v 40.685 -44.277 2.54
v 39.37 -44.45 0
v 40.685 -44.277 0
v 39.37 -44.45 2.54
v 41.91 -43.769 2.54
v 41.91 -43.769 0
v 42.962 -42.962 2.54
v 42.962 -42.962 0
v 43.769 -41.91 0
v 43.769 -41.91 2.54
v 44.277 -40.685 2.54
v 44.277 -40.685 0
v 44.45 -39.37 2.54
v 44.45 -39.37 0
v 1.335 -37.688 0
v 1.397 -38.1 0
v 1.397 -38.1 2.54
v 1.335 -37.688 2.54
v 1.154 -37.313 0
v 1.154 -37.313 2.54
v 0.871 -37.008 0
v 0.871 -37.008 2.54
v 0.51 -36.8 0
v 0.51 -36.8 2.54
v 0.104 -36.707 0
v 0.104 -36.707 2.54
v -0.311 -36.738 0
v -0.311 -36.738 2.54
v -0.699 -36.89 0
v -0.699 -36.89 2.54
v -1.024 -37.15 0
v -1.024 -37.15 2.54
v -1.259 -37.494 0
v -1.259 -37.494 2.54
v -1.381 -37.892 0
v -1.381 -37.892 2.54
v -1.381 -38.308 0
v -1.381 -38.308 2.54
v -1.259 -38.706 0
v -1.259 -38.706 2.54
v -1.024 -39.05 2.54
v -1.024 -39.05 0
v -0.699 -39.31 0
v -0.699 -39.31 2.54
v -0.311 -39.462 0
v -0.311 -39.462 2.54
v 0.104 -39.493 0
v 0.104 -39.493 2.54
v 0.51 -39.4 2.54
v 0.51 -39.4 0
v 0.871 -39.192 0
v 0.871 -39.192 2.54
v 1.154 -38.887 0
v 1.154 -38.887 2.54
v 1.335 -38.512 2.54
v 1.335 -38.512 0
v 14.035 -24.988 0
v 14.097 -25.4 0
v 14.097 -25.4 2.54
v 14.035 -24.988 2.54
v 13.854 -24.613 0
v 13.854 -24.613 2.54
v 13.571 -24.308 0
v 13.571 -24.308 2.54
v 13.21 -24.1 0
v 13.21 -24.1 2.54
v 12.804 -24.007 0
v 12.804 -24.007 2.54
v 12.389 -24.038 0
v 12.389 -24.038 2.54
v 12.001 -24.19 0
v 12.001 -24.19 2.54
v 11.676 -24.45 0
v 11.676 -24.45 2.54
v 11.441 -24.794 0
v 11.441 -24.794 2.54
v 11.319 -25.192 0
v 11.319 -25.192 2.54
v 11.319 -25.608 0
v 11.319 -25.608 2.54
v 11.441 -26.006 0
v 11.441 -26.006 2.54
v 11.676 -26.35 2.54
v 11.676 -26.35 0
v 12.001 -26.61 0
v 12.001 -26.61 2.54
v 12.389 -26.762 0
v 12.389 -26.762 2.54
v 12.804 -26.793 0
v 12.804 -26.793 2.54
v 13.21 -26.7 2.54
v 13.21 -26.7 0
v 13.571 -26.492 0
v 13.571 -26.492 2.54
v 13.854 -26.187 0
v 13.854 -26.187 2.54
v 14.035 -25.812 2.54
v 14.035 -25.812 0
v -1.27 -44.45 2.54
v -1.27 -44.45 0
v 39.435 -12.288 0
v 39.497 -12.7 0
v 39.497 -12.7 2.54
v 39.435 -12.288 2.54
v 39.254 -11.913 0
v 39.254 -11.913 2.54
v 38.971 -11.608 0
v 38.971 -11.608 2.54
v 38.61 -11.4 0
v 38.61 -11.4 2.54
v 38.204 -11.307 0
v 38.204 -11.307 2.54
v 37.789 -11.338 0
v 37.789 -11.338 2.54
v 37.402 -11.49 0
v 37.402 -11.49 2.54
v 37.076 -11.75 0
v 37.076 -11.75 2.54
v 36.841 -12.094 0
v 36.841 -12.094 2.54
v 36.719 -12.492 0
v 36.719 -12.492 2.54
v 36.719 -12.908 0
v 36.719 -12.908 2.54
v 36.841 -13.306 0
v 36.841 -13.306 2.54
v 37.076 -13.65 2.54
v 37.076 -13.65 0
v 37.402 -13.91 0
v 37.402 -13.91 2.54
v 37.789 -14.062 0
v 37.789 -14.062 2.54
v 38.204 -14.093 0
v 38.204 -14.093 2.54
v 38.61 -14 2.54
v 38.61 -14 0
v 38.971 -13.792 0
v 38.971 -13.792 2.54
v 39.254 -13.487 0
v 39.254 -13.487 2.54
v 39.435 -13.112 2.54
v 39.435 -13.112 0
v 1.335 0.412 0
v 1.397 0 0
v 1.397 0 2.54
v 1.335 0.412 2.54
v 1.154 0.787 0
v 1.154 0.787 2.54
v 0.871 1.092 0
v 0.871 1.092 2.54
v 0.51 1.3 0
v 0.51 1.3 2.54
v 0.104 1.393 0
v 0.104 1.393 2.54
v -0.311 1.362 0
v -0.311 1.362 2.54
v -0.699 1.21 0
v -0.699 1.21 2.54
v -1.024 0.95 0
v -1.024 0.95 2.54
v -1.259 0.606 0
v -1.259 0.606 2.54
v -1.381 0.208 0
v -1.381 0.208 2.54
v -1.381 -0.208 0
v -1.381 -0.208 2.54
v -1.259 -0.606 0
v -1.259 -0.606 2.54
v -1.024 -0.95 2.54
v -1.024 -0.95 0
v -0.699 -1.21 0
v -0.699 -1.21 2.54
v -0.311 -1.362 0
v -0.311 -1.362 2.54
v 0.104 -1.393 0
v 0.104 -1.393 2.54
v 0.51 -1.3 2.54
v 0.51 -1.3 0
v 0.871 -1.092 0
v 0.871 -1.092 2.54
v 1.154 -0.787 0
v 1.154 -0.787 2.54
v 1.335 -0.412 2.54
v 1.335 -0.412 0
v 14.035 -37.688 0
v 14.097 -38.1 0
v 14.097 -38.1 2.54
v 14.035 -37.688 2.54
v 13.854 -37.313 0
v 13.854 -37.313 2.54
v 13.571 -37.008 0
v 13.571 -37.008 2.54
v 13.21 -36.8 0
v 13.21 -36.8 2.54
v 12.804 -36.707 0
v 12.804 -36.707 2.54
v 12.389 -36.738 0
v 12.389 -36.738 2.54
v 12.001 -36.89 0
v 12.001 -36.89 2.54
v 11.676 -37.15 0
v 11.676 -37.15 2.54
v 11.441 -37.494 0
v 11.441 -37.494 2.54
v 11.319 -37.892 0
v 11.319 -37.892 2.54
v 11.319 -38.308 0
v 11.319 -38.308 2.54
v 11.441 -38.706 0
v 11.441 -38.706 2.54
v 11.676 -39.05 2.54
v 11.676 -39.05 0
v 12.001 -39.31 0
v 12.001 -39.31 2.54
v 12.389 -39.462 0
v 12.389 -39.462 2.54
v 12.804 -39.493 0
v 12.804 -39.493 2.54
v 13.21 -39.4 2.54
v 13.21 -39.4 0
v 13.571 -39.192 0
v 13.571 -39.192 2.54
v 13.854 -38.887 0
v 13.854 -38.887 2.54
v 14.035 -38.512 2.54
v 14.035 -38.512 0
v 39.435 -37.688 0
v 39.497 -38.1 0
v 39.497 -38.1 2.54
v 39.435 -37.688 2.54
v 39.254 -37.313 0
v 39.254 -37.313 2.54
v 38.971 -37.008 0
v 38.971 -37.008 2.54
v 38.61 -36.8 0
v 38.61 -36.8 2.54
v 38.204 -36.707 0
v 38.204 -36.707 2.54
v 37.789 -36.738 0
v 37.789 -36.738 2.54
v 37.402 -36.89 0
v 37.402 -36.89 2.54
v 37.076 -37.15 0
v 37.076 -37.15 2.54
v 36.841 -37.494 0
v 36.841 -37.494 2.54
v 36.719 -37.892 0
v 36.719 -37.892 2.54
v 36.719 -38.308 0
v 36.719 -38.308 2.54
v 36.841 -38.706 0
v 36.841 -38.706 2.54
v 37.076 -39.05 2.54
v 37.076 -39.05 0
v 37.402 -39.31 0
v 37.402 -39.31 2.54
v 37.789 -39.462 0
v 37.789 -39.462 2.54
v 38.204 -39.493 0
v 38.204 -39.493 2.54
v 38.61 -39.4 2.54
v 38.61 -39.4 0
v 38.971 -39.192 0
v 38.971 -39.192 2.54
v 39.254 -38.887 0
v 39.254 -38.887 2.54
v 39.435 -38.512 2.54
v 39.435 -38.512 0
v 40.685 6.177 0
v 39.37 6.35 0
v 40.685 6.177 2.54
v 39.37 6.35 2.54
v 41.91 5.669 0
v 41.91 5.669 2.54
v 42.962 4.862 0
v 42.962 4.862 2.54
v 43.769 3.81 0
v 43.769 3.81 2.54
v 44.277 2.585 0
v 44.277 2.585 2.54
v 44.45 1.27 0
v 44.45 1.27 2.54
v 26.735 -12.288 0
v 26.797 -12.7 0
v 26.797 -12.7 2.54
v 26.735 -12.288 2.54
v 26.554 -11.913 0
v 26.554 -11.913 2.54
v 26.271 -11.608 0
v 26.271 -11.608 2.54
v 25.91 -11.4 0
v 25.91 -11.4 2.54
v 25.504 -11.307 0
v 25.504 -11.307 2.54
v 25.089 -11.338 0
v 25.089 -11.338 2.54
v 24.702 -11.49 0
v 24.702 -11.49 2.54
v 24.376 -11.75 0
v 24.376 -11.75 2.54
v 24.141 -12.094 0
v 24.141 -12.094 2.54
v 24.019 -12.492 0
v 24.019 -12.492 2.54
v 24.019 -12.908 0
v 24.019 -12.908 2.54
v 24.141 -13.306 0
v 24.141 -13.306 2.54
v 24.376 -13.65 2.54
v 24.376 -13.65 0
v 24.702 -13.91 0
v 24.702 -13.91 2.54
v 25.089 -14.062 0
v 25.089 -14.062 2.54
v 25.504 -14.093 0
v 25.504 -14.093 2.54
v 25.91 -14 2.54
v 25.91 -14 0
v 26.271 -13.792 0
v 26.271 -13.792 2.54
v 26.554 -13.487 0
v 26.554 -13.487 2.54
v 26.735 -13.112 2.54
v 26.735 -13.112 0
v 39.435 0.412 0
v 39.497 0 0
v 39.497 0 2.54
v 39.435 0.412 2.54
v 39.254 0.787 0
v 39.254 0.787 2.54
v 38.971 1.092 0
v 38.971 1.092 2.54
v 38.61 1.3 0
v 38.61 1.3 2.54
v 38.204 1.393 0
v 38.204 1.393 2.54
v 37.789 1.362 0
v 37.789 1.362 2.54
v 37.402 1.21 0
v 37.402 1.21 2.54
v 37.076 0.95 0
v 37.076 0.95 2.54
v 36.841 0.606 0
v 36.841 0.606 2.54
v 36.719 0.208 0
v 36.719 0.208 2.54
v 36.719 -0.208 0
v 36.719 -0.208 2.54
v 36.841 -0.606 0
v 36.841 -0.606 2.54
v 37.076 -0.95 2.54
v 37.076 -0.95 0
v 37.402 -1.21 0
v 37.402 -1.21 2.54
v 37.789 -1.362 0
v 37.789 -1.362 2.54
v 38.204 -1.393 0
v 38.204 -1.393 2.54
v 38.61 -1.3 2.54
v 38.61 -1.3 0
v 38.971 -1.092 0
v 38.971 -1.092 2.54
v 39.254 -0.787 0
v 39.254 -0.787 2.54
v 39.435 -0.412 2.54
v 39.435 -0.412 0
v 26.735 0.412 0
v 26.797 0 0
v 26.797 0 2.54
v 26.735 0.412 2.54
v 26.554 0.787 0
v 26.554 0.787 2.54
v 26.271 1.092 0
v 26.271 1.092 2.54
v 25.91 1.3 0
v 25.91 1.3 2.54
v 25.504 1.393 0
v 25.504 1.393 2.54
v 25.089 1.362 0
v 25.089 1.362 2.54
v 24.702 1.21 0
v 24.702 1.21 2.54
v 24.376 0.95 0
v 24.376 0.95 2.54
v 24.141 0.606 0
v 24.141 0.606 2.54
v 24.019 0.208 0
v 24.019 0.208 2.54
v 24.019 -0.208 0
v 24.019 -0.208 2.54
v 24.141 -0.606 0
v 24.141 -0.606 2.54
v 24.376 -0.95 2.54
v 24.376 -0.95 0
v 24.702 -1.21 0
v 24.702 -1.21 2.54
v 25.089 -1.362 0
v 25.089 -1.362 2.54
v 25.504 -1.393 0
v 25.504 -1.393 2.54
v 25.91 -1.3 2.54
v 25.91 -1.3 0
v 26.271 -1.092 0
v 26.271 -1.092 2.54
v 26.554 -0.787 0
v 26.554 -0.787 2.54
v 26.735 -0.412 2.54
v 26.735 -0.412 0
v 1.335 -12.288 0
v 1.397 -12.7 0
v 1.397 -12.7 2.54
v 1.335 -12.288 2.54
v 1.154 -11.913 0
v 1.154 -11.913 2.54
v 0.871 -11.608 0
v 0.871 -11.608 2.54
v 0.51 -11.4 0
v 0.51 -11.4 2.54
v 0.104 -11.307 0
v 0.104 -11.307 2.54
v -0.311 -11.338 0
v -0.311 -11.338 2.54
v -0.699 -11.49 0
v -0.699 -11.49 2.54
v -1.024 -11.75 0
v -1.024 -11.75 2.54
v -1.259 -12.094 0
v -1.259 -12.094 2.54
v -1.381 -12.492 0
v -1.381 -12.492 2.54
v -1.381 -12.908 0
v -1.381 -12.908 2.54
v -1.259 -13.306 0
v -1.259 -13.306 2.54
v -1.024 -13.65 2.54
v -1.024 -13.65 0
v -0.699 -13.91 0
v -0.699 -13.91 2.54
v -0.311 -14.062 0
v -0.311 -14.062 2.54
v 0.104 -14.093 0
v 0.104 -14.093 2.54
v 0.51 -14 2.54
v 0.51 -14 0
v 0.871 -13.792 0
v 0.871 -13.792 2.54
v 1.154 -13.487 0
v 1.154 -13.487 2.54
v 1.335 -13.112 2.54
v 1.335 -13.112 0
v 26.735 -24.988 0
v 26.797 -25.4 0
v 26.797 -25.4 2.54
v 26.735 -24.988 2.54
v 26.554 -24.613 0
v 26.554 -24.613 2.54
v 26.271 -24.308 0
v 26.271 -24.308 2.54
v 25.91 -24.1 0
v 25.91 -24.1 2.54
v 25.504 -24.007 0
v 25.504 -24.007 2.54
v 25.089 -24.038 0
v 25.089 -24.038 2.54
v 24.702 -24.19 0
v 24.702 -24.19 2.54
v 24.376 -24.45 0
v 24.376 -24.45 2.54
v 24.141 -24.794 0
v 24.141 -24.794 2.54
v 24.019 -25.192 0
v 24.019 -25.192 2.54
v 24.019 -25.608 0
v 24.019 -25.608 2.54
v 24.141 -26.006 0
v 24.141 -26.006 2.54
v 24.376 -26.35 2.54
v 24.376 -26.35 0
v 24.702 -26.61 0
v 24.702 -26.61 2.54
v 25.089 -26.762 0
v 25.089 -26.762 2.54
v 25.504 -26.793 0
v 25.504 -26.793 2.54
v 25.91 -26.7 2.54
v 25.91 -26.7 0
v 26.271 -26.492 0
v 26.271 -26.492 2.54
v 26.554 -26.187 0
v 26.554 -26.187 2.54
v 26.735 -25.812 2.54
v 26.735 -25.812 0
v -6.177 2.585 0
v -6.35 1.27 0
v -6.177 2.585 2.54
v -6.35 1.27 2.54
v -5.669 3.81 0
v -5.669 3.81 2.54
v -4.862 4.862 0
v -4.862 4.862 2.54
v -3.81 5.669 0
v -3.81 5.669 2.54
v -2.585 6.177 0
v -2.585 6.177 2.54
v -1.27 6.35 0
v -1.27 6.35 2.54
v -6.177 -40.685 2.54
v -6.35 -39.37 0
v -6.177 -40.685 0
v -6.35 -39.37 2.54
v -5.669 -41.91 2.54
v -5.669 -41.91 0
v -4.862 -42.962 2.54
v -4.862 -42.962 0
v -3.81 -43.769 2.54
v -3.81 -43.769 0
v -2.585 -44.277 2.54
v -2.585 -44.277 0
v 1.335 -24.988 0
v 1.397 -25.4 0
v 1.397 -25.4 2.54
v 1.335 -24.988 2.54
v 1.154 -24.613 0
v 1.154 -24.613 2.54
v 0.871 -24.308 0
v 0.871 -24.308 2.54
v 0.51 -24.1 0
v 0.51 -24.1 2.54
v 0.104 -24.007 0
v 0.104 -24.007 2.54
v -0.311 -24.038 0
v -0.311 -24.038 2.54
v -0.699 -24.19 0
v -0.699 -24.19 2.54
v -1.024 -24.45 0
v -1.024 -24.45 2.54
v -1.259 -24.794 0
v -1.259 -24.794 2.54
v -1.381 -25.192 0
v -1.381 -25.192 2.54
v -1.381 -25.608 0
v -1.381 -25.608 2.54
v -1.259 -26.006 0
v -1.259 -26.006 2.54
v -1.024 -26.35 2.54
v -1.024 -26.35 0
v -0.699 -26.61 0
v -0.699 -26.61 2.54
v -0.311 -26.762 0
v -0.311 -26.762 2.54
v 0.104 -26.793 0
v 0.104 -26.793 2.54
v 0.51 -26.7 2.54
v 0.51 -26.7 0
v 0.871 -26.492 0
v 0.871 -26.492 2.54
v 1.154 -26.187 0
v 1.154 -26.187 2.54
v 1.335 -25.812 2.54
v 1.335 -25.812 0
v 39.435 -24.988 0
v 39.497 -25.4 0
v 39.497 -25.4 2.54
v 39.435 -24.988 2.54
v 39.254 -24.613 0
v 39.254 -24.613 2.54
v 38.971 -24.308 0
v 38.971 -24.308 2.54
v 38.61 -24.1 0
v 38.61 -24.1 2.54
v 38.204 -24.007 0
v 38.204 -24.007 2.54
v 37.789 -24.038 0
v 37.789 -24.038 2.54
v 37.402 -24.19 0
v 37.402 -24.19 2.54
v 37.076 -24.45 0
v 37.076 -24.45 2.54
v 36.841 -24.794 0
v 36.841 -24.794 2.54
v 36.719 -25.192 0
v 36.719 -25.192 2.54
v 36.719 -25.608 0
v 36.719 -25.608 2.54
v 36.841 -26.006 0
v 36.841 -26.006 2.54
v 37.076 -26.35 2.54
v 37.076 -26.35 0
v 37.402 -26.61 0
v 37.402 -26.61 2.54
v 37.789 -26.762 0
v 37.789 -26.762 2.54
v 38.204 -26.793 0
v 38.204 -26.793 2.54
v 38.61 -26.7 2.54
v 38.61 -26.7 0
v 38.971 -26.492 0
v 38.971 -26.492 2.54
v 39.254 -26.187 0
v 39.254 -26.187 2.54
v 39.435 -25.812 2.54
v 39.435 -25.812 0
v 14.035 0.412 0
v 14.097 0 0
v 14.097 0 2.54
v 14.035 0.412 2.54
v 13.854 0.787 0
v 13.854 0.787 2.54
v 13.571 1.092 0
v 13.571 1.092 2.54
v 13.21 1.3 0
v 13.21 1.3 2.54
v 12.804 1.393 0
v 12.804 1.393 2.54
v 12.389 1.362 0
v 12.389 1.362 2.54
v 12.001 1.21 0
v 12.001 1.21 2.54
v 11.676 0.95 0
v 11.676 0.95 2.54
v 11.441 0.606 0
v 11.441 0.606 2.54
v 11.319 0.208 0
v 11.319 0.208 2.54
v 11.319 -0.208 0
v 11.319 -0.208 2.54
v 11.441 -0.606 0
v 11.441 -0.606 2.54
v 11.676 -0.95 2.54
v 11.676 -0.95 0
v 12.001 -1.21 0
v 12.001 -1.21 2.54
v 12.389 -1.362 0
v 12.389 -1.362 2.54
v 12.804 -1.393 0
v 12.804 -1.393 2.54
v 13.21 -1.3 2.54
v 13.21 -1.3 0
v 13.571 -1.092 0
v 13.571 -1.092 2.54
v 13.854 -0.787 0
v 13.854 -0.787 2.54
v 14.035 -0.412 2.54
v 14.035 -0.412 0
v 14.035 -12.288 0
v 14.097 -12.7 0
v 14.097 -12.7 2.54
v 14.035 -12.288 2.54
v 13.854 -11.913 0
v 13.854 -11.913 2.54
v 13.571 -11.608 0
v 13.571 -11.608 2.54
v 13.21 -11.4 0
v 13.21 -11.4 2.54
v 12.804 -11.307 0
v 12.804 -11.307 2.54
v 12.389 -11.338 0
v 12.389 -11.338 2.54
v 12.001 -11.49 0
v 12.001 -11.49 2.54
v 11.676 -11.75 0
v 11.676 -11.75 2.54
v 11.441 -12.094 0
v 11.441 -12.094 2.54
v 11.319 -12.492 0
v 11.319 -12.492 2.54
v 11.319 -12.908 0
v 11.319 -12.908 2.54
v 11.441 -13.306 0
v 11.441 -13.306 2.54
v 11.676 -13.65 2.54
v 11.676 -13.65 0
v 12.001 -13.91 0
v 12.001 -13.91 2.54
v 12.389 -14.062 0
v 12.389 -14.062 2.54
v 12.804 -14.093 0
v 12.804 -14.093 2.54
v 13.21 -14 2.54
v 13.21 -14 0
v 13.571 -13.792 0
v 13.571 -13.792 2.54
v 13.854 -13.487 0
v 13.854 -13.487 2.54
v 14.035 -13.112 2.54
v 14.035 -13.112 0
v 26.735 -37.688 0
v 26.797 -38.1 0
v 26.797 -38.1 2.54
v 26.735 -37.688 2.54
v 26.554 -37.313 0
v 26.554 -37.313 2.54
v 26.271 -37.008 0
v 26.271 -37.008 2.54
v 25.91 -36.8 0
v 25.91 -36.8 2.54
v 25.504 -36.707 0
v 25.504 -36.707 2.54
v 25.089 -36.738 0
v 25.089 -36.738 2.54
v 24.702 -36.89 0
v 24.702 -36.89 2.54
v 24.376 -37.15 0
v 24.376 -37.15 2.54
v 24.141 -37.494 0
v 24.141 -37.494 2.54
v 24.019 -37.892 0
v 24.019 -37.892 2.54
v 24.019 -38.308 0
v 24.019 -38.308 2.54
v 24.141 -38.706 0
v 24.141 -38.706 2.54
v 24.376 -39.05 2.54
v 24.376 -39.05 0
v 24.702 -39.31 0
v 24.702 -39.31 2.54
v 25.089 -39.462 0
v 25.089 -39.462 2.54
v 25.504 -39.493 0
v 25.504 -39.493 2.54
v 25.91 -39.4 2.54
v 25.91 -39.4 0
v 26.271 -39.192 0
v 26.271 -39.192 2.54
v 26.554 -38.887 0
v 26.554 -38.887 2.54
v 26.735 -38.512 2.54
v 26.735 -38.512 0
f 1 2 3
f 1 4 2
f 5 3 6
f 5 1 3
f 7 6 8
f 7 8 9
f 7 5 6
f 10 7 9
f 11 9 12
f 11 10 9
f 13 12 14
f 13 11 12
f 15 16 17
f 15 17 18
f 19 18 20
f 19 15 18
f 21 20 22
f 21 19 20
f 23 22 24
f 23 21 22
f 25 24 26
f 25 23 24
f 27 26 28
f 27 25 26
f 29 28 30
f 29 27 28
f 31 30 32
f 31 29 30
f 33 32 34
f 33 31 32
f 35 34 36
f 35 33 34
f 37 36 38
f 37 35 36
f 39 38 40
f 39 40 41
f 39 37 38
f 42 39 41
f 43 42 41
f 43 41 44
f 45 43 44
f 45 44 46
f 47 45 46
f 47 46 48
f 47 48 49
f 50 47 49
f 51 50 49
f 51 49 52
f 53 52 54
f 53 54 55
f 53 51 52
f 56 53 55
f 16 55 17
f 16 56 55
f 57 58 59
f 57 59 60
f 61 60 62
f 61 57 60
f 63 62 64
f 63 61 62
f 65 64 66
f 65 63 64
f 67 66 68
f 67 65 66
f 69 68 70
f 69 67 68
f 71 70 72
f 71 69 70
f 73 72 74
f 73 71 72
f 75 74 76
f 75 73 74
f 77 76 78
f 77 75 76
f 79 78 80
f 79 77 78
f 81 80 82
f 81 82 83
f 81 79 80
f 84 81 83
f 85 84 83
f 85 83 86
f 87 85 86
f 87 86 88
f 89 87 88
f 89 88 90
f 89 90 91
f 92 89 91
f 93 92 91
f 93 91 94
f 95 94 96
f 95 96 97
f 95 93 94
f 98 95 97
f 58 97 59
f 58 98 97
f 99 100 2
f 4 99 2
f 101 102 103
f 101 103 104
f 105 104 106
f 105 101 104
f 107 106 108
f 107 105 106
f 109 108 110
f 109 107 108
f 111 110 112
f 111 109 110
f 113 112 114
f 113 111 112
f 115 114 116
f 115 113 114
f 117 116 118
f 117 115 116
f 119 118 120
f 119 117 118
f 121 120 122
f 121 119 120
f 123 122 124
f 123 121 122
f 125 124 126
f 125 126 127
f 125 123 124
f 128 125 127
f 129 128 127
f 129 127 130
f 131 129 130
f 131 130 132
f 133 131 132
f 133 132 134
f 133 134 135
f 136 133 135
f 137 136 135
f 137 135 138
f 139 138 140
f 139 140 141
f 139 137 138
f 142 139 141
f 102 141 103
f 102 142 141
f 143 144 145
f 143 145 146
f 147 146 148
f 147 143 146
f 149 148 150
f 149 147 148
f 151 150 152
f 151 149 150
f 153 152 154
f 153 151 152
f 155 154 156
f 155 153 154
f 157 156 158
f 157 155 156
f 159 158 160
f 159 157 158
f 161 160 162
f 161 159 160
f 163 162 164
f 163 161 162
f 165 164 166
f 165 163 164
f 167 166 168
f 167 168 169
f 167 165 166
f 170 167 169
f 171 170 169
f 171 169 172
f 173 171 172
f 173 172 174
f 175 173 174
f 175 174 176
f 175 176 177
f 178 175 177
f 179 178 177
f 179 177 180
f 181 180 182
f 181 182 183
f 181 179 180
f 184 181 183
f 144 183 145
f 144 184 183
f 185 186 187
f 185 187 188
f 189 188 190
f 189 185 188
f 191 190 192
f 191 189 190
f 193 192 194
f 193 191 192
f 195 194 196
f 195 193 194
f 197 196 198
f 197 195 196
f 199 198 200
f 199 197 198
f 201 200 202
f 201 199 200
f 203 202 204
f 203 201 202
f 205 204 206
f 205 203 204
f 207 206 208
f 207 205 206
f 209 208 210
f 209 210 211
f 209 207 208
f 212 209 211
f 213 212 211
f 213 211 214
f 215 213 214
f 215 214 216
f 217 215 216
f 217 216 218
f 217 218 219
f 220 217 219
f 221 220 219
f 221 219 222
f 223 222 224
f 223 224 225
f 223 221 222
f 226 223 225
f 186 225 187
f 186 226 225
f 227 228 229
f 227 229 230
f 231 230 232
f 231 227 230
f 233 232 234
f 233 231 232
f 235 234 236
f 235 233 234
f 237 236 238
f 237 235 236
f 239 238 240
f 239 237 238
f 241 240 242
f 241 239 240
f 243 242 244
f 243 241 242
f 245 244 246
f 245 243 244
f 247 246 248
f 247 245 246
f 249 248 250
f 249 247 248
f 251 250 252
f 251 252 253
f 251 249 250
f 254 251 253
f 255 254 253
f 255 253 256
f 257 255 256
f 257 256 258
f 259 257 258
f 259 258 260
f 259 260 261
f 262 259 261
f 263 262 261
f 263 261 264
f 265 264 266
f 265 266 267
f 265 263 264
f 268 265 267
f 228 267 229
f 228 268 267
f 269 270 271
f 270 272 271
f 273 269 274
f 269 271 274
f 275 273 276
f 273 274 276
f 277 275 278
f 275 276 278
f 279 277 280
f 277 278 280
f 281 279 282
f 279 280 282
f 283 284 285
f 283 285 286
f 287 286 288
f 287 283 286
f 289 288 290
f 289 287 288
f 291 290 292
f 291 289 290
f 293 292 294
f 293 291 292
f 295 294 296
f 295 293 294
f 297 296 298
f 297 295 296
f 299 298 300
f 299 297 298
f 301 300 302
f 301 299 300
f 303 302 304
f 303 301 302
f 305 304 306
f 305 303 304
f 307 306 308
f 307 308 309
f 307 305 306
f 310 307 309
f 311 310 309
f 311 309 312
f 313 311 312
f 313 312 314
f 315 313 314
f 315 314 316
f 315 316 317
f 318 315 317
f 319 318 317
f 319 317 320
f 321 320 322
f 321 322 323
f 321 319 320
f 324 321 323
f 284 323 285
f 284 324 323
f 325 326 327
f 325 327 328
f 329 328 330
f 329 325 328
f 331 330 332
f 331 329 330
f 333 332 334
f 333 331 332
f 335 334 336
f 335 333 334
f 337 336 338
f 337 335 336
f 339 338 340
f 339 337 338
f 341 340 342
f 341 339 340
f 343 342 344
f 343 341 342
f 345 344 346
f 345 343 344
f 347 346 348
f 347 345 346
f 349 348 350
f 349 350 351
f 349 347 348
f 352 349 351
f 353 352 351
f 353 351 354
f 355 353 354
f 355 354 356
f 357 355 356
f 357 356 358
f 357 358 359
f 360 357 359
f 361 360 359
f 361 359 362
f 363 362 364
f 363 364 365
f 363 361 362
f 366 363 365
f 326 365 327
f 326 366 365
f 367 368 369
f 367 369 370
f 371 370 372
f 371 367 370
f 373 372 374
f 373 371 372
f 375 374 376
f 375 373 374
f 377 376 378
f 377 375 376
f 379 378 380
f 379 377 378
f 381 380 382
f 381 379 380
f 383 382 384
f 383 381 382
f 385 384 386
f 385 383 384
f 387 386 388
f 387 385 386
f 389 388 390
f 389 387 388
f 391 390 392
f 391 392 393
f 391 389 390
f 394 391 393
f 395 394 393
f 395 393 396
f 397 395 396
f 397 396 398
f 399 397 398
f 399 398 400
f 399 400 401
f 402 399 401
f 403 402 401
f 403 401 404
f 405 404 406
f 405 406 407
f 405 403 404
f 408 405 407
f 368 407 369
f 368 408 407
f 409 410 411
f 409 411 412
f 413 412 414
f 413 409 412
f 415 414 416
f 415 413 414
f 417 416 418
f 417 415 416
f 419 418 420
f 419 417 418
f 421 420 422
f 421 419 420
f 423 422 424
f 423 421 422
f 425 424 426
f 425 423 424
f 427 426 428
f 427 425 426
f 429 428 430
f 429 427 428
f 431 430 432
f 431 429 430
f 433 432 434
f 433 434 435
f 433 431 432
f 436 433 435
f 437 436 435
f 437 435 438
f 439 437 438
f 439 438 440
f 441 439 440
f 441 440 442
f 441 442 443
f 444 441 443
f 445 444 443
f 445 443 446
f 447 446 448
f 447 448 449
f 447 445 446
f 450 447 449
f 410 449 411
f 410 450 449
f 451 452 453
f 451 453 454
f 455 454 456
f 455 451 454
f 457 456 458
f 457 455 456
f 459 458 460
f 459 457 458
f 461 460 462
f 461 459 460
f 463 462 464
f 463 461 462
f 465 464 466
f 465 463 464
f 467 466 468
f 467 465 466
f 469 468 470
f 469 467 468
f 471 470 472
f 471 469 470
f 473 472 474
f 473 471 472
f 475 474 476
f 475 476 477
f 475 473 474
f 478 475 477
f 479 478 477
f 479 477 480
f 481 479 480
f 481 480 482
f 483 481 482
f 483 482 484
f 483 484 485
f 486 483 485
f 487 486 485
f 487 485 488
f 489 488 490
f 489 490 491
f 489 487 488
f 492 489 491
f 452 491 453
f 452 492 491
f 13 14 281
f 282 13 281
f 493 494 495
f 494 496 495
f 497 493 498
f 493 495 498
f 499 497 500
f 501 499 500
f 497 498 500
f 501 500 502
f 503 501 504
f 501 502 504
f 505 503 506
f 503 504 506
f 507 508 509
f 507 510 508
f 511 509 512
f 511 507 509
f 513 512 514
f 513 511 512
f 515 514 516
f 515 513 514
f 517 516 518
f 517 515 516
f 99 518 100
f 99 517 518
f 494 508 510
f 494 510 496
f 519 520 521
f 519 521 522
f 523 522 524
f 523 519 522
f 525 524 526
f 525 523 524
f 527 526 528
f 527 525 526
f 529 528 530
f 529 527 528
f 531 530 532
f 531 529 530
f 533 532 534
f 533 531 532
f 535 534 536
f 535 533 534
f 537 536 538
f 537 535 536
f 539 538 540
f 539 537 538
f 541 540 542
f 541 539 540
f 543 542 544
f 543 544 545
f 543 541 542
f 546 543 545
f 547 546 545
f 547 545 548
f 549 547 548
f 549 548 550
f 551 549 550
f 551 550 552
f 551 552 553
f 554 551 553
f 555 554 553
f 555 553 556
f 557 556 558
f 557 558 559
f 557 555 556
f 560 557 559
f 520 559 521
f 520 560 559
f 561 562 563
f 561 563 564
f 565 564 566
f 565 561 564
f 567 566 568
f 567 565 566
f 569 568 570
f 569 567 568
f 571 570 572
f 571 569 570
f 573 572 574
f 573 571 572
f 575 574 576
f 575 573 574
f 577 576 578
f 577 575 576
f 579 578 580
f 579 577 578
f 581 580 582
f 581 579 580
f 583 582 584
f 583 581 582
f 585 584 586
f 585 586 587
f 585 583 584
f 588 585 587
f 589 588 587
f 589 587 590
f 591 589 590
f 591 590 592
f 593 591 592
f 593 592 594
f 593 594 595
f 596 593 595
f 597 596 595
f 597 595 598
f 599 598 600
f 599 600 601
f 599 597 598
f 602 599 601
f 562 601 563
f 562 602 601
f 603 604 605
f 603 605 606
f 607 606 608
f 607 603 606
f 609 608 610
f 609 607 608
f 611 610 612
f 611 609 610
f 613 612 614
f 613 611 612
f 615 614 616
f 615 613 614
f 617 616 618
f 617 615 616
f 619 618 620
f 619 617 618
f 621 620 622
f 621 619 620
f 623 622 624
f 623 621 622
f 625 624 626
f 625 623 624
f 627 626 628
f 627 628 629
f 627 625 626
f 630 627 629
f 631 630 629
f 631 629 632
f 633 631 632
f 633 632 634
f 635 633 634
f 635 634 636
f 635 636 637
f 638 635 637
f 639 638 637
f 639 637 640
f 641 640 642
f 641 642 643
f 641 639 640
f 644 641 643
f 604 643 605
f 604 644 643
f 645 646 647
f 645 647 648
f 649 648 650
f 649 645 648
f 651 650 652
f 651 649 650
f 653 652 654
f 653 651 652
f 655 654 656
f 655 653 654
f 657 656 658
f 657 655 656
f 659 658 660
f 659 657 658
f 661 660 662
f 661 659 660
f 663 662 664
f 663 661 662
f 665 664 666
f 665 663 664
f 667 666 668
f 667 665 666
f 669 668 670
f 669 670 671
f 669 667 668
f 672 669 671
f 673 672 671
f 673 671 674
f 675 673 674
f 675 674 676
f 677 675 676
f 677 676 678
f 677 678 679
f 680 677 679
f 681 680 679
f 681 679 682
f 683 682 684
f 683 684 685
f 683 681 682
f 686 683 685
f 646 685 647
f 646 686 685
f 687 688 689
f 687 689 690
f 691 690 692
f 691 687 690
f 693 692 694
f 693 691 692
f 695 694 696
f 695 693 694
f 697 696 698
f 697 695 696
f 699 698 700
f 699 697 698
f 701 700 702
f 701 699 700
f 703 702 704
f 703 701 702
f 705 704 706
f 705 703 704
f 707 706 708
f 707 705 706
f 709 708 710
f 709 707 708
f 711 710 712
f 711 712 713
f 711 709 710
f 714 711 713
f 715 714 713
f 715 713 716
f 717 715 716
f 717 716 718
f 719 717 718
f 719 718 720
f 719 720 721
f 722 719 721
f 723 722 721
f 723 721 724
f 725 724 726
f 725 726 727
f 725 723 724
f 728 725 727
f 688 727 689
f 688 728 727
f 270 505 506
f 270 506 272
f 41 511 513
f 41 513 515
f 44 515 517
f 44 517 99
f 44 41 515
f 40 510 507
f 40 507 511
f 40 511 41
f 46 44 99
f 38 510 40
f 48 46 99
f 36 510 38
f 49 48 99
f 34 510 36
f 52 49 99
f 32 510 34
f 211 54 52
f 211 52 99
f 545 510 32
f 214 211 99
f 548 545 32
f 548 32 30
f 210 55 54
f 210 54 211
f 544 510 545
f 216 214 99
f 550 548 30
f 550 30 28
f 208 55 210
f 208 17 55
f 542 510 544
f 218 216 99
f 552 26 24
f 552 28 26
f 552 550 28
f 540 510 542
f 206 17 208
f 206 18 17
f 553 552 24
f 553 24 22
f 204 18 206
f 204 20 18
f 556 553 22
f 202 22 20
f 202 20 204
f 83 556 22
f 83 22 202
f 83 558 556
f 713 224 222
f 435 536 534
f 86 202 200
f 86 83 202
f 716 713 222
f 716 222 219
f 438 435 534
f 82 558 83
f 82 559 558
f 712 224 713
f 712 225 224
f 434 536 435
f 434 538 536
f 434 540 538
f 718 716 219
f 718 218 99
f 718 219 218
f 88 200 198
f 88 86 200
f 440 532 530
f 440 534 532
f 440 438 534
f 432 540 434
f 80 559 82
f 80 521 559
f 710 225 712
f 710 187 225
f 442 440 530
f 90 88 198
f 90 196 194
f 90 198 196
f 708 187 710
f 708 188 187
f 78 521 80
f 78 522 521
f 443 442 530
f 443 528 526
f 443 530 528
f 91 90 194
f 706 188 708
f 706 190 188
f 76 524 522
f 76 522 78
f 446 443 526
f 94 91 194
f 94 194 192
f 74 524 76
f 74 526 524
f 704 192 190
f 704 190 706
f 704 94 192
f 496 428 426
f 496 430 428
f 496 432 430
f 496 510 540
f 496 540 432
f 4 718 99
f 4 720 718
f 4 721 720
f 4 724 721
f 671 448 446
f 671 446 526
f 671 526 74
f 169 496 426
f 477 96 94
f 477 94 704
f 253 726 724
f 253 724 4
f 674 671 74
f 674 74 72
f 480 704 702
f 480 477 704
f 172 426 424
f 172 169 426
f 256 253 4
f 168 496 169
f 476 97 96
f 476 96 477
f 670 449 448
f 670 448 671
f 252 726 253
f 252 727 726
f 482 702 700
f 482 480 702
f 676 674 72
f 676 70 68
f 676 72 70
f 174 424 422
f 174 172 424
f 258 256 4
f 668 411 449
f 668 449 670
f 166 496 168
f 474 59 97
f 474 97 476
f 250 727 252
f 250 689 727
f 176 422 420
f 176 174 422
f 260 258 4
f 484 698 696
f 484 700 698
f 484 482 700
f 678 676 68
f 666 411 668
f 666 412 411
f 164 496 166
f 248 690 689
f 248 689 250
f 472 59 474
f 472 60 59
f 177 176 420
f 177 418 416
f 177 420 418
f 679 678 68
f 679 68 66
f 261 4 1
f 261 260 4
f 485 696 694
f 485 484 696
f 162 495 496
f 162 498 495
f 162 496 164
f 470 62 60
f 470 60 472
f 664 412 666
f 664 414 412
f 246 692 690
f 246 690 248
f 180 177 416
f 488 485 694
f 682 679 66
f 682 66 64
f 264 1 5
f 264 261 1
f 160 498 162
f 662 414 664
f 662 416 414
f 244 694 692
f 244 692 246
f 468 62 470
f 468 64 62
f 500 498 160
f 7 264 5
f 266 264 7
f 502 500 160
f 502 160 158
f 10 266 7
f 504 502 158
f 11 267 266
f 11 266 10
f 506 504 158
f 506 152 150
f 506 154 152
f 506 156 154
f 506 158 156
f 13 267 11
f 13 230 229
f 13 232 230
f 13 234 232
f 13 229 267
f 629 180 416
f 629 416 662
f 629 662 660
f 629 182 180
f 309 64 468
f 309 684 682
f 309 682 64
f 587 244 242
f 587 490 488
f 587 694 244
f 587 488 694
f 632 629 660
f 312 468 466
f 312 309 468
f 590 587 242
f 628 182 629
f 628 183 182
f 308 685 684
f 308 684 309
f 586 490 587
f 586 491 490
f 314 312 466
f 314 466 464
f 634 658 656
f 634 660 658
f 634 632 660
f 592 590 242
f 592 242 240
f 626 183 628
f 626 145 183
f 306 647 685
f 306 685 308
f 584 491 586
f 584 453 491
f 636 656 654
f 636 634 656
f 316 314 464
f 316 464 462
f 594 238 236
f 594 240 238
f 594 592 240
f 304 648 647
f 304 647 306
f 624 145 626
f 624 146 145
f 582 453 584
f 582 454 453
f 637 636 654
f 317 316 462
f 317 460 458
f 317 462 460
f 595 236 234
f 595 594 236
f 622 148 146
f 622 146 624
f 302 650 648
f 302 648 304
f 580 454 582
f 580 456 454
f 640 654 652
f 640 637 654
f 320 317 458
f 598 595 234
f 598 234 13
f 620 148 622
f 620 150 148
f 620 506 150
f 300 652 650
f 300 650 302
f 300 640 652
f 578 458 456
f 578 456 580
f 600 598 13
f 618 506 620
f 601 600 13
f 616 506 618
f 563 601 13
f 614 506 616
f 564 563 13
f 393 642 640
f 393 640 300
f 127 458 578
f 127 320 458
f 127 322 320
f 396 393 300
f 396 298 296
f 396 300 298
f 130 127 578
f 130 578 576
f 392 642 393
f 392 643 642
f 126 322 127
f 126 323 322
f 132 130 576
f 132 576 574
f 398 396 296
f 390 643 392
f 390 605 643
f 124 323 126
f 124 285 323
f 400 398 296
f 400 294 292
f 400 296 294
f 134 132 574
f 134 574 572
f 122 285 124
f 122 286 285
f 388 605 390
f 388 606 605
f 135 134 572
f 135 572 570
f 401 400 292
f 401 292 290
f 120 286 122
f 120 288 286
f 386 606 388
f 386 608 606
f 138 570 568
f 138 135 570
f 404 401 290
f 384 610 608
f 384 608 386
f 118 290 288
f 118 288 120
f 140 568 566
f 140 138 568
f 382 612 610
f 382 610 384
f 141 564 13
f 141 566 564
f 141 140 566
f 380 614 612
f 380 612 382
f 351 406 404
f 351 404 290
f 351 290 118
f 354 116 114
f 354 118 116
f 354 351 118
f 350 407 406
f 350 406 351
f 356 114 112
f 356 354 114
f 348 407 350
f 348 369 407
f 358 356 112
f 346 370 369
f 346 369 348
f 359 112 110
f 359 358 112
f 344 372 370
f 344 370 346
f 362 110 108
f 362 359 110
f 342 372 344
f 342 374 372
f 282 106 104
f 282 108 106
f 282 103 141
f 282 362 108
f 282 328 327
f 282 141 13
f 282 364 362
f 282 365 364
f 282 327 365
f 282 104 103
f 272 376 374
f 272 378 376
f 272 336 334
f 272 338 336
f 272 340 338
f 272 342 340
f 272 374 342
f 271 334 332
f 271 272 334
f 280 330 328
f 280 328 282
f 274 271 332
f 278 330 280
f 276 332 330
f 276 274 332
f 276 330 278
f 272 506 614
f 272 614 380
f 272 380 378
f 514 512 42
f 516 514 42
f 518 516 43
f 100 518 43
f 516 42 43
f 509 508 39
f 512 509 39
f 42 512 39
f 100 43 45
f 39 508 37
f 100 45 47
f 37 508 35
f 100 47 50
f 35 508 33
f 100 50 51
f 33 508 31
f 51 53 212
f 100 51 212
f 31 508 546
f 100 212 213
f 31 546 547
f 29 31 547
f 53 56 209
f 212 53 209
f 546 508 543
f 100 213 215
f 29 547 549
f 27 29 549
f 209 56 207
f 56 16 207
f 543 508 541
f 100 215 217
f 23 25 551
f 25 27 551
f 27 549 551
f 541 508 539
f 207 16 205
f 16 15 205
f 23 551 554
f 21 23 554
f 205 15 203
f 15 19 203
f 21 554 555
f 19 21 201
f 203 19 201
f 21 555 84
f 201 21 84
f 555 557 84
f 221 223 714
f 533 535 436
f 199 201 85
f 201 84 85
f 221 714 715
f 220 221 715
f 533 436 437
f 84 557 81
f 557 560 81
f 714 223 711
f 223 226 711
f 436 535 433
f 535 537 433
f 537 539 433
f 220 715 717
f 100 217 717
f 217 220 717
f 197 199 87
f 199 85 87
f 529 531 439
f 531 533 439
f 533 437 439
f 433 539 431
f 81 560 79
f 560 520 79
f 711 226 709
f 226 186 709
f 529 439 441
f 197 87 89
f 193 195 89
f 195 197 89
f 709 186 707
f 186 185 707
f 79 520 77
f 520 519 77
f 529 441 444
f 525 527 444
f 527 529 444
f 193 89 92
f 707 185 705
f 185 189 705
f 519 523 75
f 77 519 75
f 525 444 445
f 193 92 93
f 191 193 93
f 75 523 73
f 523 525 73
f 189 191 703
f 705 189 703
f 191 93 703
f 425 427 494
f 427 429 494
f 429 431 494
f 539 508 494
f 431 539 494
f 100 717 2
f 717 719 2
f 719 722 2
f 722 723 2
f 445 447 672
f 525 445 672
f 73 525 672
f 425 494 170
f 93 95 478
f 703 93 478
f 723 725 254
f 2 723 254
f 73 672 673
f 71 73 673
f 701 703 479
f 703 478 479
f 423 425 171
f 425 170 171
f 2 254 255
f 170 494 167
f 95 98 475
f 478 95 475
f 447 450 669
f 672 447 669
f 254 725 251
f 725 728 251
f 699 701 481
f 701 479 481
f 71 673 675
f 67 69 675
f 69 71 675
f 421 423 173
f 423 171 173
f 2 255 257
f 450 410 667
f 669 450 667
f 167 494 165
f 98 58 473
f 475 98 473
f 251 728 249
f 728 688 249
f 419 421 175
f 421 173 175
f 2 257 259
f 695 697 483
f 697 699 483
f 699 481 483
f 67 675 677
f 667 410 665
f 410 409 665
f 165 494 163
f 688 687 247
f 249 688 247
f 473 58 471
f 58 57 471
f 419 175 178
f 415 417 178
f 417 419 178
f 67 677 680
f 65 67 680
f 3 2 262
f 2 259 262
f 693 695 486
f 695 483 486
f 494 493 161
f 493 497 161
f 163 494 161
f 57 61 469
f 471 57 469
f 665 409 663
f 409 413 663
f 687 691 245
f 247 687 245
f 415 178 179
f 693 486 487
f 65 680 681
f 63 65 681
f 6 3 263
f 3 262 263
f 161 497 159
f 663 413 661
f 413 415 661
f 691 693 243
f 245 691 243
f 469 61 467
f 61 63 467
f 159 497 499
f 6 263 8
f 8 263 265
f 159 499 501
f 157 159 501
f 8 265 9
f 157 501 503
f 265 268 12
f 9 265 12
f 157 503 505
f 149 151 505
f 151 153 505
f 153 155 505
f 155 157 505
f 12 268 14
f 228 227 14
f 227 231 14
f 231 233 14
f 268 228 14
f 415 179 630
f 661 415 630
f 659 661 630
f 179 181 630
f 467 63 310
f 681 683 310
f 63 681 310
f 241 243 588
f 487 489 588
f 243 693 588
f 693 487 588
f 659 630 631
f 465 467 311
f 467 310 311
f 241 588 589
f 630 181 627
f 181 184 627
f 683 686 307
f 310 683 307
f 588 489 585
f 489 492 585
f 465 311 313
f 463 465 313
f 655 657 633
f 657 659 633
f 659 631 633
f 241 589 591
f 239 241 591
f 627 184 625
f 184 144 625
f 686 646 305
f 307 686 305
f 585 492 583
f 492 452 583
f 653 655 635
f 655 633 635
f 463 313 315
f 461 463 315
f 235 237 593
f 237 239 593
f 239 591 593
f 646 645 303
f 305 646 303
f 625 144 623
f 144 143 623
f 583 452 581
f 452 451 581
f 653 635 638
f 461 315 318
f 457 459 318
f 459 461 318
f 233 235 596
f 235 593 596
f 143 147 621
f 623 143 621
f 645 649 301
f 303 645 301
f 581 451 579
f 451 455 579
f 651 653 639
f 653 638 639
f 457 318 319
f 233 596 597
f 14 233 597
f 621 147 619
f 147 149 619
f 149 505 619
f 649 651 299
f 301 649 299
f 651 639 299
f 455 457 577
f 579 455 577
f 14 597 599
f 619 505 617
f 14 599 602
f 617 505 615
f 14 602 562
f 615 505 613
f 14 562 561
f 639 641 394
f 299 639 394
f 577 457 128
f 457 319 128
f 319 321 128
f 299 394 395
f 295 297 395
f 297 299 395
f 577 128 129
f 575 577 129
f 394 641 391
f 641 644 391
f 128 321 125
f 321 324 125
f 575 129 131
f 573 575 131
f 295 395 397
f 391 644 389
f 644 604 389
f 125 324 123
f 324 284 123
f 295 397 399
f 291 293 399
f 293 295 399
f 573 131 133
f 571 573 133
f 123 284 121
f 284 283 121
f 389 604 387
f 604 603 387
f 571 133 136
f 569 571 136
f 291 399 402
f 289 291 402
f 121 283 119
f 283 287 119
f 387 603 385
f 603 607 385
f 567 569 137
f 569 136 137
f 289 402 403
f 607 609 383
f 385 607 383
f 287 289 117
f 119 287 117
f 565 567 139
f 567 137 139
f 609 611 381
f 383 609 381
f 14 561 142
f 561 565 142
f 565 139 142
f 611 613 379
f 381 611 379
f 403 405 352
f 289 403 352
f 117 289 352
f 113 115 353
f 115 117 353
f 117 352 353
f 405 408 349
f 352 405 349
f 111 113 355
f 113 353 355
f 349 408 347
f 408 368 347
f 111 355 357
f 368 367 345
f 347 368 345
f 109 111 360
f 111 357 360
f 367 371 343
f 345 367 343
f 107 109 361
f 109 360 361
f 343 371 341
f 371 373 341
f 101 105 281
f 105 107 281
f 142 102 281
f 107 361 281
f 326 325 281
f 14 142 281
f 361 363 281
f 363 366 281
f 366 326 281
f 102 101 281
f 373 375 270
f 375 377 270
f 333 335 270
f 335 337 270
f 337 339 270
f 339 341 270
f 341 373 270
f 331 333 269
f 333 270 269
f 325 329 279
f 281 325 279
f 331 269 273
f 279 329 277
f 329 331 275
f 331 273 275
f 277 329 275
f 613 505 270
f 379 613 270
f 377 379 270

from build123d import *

# Parameters (mm, degrees)
SKETCH1_W           = 50.8
SKETCH1_H           = 50.8
SKETCH1_R           = 1.397
BOSS_EXTRUDE1_DEPTH = 2.54
FILLET1_R           = 5.08


with BuildPart() as part:
    # Sketch1 → Boss-Extrude1 (new body)
    with BuildSketch(Plane.XY):
        with Locations((19.05, -19.05)):
            Rectangle(SKETCH1_W, SKETCH1_H)
        Circle(SKETCH1_R, mode=Mode.SUBTRACT)
        with Locations((12.7, 0)):
            Circle(SKETCH1_R, mode=Mode.SUBTRACT)
        with Locations((25.4, 0)):
            Circle(SKETCH1_R, mode=Mode.SUBTRACT)
        with Locations((38.1, 0)):
            Circle(SKETCH1_R, mode=Mode.SUBTRACT)
        with Locations((12.7, -12.7)):
            Circle(SKETCH1_R, mode=Mode.SUBTRACT)
        with Locations((25.4, -12.7)):
            Circle(SKETCH1_R, mode=Mode.SUBTRACT)
        with Locations((38.1, -12.7)):
            Circle(SKETCH1_R, mode=Mode.SUBTRACT)
        with Locations((12.7, -25.4)):
            Circle(SKETCH1_R, mode=Mode.SUBTRACT)
        with Locations((25.4, -25.4)):
            Circle(SKETCH1_R, mode=Mode.SUBTRACT)
        with Locations((38.1, -25.4)):
            Circle(SKETCH1_R, mode=Mode.SUBTRACT)
        with Locations((12.7, -38.1)):
            Circle(SKETCH1_R, mode=Mode.SUBTRACT)
        with Locations((25.4, -38.1)):
            Circle(SKETCH1_R, mode=Mode.SUBTRACT)
        with Locations((38.1, -38.1)):
            Circle(SKETCH1_R, mode=Mode.SUBTRACT)
        with Locations((0, -12.7)):
            Circle(SKETCH1_R, mode=Mode.SUBTRACT)
        with Locations((0, -25.4)):
            Circle(SKETCH1_R, mode=Mode.SUBTRACT)
        with Locations((0, -38.1)):
            Circle(SKETCH1_R, mode=Mode.SUBTRACT)
    extrude(amount=BOSS_EXTRUDE1_DEPTH)

    # Fillet1
    fillet1_edges = [part.edges().sort_by_distance(p)[0] for p in [
        (-6.35, 6.35, 1.27),
        (44.45, 6.35, 1.27),
        (44.45, -44.45, 1.27),
        (-6.35, -44.45, 1.27),
    ]]
    fillet(fillet1_edges, radius=FILLET1_R)


solid = part.part
